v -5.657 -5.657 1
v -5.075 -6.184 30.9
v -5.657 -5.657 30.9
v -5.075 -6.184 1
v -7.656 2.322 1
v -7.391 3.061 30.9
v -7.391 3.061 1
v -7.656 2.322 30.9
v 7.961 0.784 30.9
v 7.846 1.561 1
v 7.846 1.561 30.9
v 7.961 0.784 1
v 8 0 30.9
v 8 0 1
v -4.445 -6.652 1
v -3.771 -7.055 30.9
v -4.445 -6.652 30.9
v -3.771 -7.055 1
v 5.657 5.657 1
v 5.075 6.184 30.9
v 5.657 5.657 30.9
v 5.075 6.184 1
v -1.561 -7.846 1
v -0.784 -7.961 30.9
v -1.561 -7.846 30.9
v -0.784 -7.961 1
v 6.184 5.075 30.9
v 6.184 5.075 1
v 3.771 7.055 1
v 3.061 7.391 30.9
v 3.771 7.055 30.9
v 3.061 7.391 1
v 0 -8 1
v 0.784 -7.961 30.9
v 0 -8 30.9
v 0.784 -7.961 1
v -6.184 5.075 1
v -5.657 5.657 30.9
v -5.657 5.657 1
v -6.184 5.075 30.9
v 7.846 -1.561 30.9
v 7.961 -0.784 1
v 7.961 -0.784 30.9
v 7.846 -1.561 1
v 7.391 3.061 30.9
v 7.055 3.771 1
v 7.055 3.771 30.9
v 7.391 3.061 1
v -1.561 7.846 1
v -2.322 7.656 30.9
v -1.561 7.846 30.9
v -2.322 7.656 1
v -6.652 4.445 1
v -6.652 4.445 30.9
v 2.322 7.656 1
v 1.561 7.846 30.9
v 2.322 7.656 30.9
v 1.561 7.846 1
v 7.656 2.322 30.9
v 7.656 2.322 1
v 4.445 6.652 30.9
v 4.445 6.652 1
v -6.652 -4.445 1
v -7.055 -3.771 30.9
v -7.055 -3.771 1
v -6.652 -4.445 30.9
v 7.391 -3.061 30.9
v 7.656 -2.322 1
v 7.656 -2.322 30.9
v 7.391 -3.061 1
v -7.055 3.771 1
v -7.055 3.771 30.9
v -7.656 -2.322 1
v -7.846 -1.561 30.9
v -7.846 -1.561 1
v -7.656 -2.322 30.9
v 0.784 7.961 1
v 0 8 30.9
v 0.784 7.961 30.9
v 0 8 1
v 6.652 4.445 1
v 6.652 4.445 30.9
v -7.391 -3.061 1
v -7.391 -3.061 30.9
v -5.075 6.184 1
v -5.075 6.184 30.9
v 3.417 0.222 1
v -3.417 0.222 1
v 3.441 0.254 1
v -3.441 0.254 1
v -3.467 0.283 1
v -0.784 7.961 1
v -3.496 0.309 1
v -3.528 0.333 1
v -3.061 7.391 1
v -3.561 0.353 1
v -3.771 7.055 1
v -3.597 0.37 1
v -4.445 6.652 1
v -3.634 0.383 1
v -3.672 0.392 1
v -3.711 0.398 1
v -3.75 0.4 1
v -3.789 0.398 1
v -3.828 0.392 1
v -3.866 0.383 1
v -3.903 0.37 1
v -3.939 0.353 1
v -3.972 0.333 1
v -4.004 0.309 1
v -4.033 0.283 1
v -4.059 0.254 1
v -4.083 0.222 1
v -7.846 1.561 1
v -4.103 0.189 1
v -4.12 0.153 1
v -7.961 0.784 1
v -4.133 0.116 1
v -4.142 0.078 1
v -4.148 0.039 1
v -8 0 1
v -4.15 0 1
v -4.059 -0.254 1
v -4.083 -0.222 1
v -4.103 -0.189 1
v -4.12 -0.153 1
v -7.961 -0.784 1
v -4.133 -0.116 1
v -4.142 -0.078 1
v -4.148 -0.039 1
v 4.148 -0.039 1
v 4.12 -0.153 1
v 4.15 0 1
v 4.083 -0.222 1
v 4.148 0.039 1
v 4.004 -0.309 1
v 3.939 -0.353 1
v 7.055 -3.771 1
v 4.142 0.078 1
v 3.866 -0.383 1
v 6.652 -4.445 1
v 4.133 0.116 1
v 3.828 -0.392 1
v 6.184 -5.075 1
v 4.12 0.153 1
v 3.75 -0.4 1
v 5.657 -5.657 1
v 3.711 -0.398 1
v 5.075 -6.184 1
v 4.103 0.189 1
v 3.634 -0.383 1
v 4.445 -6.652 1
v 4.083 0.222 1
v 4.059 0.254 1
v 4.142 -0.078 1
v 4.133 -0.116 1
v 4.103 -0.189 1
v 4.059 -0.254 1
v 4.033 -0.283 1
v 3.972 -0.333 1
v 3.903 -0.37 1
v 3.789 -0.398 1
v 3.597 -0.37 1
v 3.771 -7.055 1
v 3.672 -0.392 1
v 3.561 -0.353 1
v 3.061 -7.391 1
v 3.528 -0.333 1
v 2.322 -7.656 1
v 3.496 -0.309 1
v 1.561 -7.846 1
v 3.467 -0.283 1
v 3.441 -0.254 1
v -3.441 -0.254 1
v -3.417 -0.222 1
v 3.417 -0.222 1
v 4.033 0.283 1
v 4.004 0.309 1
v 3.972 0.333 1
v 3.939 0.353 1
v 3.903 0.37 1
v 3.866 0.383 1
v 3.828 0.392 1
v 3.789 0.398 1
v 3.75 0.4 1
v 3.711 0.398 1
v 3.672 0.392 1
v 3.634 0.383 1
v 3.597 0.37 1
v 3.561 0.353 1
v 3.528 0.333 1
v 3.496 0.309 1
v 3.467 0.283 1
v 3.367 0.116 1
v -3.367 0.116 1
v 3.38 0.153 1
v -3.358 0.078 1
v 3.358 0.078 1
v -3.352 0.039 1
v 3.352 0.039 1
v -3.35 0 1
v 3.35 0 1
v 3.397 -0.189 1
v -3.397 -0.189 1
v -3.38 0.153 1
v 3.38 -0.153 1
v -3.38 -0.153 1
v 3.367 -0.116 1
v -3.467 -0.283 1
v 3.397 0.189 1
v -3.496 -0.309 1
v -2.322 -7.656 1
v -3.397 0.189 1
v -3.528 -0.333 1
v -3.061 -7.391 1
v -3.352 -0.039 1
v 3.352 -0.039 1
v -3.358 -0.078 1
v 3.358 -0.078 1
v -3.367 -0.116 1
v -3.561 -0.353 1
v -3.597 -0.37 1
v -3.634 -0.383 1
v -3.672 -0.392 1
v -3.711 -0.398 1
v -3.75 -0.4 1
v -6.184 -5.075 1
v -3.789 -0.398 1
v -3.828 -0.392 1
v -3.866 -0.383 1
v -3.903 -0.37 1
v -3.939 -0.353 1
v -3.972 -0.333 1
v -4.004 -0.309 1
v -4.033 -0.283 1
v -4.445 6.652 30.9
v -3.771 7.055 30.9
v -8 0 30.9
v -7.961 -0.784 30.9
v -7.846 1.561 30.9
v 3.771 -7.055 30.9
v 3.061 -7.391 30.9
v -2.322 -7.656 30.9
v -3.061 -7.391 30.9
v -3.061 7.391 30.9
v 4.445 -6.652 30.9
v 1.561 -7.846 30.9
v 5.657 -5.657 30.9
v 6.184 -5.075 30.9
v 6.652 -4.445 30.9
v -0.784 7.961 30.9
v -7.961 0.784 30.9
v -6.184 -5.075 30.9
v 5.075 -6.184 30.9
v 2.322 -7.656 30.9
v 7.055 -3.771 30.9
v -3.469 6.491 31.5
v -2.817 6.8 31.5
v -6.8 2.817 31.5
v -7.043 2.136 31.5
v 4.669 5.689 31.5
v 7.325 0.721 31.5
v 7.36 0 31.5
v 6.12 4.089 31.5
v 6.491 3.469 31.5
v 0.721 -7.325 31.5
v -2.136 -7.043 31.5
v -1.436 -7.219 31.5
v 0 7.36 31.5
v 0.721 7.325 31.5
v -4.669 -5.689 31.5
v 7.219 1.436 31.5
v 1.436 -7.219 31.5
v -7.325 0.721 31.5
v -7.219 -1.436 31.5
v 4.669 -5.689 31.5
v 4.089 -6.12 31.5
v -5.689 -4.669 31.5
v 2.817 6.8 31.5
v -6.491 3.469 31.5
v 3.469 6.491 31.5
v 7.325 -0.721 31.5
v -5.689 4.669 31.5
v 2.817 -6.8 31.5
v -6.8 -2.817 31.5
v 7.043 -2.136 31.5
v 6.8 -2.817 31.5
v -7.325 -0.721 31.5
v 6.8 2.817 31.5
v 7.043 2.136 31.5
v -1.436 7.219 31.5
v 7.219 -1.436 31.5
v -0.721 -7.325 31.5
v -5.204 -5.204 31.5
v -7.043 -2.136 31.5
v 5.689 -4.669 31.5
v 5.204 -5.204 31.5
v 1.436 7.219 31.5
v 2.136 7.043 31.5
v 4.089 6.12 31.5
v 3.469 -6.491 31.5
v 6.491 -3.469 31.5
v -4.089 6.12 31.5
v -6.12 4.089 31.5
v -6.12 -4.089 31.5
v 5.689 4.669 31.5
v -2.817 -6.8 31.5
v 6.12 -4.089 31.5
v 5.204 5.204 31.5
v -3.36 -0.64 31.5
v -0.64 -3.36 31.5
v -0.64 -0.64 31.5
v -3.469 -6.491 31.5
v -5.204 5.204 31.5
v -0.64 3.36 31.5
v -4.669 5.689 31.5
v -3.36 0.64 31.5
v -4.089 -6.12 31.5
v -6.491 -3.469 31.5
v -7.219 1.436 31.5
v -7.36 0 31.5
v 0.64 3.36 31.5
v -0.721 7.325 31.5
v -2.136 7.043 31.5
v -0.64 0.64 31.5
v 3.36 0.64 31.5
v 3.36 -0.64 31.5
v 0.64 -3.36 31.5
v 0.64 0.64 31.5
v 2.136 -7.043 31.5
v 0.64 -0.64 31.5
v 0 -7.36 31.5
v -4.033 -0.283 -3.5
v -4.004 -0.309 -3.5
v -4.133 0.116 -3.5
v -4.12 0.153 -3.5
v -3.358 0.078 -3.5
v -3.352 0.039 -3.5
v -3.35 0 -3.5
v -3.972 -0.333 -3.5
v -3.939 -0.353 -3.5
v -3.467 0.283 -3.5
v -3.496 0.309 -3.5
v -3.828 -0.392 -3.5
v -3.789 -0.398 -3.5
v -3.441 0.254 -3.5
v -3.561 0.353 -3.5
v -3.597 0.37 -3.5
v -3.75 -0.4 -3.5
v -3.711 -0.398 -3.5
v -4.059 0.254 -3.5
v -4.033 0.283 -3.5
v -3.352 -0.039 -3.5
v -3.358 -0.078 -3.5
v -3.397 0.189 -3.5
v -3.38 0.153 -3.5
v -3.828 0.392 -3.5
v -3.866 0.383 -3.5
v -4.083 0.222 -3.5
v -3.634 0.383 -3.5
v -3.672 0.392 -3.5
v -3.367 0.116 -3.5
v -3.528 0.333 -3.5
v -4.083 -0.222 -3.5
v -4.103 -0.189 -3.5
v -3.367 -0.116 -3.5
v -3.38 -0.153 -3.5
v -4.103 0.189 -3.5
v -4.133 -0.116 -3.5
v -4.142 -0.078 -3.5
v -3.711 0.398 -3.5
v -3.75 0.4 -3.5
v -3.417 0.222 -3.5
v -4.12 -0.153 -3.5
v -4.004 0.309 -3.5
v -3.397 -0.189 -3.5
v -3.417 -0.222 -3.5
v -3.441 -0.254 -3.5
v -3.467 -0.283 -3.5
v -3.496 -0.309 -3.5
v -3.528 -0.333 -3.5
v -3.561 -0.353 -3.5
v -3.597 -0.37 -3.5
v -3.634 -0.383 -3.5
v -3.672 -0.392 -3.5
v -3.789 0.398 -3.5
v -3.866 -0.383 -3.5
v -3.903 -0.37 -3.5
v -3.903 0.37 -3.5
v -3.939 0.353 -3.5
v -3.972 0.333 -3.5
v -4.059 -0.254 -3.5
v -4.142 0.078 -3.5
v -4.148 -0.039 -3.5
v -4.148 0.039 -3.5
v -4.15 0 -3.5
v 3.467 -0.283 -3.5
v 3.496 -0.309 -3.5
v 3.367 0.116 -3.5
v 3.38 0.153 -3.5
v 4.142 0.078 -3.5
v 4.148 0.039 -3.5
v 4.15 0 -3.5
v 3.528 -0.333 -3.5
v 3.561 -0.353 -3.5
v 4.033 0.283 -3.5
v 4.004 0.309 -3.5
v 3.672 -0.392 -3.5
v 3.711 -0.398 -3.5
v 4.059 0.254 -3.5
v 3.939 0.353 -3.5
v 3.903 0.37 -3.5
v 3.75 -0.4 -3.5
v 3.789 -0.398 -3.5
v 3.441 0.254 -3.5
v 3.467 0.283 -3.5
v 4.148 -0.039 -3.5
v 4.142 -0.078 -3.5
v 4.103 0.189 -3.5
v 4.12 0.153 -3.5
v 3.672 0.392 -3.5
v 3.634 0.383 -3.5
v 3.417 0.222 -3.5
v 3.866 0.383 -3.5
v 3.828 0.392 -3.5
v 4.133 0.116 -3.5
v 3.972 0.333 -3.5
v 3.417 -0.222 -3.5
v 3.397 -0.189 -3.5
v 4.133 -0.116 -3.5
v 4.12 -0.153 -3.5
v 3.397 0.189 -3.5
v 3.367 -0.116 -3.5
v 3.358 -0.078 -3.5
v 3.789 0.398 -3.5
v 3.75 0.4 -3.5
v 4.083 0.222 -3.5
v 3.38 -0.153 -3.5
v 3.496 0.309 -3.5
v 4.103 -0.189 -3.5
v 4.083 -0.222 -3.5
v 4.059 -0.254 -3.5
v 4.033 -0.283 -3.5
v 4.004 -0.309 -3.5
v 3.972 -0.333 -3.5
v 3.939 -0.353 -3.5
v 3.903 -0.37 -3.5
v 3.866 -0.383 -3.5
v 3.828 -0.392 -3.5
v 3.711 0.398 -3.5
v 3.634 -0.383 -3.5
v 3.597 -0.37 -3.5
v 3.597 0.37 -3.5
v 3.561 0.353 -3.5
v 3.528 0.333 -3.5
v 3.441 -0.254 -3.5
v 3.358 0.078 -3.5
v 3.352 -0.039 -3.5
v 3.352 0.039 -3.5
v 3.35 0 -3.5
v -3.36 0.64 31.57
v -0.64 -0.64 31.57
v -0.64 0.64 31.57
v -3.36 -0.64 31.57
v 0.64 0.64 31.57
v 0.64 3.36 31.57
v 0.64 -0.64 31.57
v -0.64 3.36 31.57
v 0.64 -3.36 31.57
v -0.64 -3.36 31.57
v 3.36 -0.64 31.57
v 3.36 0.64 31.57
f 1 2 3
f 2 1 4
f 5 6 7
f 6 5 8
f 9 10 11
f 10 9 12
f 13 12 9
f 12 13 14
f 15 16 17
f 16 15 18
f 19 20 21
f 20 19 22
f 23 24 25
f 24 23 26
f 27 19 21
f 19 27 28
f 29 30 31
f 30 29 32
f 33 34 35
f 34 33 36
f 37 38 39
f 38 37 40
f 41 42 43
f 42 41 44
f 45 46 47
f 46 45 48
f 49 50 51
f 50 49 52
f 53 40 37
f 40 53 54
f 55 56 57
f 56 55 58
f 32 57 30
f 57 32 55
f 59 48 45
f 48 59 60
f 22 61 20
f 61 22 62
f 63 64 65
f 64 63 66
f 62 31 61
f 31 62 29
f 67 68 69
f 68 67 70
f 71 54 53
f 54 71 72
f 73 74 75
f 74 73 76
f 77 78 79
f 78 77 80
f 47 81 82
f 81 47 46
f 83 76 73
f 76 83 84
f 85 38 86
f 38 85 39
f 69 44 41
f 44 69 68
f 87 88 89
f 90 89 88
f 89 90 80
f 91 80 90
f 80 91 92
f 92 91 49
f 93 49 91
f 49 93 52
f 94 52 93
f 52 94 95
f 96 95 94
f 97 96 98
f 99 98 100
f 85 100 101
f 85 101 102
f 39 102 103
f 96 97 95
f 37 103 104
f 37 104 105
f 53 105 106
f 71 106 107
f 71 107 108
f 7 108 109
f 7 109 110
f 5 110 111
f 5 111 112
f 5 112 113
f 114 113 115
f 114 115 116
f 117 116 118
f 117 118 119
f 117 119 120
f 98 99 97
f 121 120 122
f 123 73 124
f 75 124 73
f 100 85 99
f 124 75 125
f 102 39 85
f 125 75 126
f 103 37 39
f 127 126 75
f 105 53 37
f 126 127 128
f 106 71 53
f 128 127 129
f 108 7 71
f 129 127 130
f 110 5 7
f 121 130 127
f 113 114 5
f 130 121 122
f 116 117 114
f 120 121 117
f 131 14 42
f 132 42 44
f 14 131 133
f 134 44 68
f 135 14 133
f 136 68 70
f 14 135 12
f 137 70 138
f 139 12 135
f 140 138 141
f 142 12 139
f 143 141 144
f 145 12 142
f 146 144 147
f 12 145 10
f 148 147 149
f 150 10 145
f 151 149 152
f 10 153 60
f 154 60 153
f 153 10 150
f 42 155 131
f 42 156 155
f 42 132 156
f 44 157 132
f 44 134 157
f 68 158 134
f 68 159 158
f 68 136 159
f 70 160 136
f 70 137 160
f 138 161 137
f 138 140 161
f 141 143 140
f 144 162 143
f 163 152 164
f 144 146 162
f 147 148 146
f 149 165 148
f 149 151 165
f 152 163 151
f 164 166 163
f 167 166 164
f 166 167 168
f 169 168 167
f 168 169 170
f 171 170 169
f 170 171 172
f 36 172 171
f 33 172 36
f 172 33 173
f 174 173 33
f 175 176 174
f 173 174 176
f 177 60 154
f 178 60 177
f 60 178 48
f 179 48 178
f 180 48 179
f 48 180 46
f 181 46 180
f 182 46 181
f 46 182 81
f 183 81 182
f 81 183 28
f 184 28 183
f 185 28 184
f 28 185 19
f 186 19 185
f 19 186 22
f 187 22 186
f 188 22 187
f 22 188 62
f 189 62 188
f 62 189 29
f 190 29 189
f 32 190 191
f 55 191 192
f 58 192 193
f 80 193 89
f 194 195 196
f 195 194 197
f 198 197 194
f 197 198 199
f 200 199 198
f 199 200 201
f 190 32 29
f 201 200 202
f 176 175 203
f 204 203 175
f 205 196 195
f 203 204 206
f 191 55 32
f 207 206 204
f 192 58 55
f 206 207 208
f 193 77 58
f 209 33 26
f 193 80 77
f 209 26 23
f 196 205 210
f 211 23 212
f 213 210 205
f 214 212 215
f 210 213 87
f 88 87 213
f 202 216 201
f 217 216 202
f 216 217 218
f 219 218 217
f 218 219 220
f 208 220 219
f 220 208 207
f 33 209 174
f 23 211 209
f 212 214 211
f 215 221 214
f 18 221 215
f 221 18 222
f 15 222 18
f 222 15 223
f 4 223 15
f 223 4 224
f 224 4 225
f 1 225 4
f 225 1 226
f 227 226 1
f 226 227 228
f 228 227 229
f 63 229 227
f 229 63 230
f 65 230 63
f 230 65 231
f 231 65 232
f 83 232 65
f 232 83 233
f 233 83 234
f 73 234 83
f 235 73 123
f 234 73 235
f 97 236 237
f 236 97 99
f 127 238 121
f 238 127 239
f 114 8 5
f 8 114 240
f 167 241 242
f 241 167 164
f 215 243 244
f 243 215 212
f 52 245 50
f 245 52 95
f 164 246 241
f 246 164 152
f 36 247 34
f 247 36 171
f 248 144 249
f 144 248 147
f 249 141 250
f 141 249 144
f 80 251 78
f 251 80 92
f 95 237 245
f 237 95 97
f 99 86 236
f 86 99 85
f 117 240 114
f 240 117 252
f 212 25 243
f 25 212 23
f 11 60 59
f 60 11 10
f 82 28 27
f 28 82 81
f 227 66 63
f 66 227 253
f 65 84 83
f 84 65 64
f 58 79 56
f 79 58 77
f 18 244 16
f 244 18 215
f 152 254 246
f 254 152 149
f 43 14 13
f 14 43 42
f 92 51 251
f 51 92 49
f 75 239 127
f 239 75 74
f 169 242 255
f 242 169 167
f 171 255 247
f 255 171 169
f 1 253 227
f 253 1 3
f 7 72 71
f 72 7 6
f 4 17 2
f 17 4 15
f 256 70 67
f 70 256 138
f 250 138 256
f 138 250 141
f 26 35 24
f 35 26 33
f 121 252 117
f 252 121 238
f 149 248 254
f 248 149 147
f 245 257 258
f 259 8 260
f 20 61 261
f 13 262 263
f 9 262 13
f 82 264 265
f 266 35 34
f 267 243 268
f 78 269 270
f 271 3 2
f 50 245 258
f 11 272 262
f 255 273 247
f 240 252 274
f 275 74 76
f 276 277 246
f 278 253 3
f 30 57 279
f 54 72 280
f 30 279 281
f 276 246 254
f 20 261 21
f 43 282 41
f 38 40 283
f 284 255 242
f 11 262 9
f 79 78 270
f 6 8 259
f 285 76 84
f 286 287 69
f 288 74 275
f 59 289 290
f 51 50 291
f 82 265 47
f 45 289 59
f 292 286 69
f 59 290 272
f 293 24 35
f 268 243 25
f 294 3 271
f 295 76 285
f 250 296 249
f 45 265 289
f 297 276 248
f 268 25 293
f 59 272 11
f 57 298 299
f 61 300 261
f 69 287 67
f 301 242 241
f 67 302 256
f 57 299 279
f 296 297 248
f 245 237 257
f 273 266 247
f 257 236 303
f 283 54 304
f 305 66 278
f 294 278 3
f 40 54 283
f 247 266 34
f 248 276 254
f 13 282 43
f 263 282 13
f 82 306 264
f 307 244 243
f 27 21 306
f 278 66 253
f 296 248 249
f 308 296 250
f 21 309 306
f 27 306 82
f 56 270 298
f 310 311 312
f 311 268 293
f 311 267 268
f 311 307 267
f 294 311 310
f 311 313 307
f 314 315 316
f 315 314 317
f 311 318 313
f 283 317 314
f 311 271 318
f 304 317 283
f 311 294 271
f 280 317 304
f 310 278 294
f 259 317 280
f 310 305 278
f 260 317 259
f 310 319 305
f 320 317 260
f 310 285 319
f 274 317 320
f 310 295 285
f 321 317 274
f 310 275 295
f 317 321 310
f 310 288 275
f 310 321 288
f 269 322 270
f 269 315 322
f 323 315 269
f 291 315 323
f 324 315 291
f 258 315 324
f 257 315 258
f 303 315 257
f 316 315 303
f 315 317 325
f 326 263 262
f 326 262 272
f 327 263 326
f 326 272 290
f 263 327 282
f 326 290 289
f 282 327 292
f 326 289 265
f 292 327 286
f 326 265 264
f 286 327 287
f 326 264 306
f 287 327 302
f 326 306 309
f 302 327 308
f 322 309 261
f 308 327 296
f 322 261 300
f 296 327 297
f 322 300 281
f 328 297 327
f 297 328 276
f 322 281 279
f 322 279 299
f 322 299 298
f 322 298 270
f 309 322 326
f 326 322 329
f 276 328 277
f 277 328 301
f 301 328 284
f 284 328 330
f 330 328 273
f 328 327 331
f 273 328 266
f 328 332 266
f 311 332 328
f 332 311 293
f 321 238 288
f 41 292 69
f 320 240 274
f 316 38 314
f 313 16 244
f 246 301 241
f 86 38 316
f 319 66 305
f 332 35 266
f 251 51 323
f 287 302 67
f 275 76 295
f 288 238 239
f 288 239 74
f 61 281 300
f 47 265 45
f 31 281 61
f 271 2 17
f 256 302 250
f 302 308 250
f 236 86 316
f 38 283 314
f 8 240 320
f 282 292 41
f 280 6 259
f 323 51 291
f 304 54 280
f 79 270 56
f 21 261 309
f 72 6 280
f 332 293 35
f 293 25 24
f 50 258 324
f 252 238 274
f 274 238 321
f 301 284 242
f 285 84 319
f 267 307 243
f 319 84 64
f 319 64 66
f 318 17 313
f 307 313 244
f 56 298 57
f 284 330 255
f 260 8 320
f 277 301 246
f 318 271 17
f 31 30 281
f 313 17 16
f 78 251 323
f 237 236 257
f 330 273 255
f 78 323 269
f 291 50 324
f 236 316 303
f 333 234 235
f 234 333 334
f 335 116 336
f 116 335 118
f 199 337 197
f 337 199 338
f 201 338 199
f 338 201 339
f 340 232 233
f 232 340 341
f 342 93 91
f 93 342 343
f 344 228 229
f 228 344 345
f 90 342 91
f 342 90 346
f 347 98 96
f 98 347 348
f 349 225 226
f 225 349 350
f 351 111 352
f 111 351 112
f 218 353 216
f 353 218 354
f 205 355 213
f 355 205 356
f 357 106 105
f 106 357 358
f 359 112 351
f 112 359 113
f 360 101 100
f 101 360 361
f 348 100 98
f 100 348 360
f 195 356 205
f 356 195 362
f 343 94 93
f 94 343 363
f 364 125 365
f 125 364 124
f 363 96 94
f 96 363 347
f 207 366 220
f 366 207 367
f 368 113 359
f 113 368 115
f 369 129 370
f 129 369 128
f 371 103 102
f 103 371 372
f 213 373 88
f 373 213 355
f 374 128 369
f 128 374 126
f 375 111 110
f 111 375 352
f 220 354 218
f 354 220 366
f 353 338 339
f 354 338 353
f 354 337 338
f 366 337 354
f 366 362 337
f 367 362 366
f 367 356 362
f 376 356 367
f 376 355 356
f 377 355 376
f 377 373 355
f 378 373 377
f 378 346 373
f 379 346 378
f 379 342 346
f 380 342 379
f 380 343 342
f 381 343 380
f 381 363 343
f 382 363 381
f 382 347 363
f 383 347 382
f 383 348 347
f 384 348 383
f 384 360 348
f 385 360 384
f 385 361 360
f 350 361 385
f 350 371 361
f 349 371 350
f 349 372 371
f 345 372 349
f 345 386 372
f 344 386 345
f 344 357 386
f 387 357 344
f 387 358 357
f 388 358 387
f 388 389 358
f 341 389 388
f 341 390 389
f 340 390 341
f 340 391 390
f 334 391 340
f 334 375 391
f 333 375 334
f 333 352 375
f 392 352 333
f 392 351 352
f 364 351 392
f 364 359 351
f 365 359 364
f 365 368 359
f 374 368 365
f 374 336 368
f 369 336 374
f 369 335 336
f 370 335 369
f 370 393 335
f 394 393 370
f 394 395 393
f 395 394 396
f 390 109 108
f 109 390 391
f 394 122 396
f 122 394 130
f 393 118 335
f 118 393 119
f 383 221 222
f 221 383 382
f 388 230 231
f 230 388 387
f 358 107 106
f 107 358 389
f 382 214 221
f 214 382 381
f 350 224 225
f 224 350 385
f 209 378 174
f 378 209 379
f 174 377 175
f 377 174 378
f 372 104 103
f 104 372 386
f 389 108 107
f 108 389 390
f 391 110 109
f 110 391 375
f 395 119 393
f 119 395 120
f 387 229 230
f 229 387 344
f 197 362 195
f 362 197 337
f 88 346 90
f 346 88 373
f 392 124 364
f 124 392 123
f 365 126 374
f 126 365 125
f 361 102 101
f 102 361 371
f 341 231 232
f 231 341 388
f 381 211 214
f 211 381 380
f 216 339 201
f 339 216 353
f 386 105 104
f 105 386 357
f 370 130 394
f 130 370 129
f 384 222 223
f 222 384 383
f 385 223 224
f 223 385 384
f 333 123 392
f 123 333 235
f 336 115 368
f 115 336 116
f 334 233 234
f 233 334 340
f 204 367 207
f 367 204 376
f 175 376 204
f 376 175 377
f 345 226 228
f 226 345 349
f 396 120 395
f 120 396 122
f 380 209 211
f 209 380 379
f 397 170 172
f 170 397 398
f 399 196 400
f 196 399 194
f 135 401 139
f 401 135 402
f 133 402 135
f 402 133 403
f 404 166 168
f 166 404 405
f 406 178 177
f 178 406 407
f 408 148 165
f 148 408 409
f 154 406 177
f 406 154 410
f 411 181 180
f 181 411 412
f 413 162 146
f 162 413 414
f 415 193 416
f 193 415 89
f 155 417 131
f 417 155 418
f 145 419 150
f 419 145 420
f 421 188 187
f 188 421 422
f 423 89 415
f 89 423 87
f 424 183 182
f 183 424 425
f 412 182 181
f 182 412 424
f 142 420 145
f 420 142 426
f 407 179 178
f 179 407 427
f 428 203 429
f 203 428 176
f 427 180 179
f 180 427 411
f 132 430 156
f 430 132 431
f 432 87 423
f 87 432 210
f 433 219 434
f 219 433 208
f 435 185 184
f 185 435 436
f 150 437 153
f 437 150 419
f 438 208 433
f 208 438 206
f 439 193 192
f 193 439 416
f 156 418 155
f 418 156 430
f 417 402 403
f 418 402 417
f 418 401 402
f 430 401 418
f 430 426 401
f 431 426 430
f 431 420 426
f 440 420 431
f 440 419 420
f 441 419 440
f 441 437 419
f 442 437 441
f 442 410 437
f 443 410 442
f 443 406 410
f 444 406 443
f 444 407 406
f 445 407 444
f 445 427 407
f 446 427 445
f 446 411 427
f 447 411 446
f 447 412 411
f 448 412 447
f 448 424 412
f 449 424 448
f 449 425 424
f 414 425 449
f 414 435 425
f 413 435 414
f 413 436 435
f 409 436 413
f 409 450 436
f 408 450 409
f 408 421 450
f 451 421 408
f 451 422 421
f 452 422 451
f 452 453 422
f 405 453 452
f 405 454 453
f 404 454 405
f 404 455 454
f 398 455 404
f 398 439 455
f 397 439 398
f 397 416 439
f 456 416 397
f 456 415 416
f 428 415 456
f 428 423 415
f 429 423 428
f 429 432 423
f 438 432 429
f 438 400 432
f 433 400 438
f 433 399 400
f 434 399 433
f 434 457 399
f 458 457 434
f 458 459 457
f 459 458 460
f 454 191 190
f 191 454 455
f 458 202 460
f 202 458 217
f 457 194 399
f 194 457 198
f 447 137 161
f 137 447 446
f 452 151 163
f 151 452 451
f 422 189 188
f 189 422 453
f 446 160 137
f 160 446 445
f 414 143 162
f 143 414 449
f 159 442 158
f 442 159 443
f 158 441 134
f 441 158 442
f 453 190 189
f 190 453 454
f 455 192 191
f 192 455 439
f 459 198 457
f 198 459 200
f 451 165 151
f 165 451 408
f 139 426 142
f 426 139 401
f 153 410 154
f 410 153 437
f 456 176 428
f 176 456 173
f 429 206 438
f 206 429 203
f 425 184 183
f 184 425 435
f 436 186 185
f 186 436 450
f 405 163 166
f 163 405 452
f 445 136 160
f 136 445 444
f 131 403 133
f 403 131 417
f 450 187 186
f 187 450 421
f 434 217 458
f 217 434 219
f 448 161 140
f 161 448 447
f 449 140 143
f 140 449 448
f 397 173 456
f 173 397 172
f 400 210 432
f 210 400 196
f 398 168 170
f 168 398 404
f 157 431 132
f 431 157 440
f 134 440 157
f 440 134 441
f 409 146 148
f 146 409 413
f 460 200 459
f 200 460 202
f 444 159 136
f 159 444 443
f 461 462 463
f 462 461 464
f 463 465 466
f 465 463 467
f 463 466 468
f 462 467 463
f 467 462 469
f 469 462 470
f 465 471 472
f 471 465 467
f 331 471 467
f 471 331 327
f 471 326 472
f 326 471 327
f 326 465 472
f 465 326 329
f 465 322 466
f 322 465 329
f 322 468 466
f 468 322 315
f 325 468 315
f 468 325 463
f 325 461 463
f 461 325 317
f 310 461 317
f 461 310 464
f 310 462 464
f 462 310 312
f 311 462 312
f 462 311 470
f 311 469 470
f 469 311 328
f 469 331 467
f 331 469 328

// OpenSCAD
$fn = 64;

body_diameter = 16;
body_height = 30.5;
lead_spacing = 7.5;
lead_diameter = 0.8;
lead_length_below = 3.5;
body_lift = 1;
lead_stub = 1;
top_chamfer = 0.6;

module lead(x) {
    color([0.75, 0.75, 0.75])
    translate([x, 0, -lead_length_below])
        cylinder(h = lead_length_below + body_lift + lead_stub, d = lead_diameter);
}

module capacitor_body() {
    color([0.16, 0.18, 0.19])
    union() {
        translate([0, 0, body_lift])
            cylinder(h = body_height - top_chamfer, d = body_diameter);
        translate([0, 0, body_lift + body_height - top_chamfer])
            cylinder(h = top_chamfer, d1 = body_diameter, d2 = body_diameter * 0.92);
    }
}

module top_vent() {
    color([0.78, 0.78, 0.78])
    translate([0, 0, body_lift + body_height - 0.05])
    linear_extrude(height = 0.12)
    union() {
        square([body_diameter * 0.42, body_diameter * 0.08], center = true);
        square([body_diameter * 0.08, body_diameter * 0.42], center = true);
    }
}

lead(-lead_spacing / 2);
lead( lead_spacing / 2);
capacitor_body();
top_vent();
